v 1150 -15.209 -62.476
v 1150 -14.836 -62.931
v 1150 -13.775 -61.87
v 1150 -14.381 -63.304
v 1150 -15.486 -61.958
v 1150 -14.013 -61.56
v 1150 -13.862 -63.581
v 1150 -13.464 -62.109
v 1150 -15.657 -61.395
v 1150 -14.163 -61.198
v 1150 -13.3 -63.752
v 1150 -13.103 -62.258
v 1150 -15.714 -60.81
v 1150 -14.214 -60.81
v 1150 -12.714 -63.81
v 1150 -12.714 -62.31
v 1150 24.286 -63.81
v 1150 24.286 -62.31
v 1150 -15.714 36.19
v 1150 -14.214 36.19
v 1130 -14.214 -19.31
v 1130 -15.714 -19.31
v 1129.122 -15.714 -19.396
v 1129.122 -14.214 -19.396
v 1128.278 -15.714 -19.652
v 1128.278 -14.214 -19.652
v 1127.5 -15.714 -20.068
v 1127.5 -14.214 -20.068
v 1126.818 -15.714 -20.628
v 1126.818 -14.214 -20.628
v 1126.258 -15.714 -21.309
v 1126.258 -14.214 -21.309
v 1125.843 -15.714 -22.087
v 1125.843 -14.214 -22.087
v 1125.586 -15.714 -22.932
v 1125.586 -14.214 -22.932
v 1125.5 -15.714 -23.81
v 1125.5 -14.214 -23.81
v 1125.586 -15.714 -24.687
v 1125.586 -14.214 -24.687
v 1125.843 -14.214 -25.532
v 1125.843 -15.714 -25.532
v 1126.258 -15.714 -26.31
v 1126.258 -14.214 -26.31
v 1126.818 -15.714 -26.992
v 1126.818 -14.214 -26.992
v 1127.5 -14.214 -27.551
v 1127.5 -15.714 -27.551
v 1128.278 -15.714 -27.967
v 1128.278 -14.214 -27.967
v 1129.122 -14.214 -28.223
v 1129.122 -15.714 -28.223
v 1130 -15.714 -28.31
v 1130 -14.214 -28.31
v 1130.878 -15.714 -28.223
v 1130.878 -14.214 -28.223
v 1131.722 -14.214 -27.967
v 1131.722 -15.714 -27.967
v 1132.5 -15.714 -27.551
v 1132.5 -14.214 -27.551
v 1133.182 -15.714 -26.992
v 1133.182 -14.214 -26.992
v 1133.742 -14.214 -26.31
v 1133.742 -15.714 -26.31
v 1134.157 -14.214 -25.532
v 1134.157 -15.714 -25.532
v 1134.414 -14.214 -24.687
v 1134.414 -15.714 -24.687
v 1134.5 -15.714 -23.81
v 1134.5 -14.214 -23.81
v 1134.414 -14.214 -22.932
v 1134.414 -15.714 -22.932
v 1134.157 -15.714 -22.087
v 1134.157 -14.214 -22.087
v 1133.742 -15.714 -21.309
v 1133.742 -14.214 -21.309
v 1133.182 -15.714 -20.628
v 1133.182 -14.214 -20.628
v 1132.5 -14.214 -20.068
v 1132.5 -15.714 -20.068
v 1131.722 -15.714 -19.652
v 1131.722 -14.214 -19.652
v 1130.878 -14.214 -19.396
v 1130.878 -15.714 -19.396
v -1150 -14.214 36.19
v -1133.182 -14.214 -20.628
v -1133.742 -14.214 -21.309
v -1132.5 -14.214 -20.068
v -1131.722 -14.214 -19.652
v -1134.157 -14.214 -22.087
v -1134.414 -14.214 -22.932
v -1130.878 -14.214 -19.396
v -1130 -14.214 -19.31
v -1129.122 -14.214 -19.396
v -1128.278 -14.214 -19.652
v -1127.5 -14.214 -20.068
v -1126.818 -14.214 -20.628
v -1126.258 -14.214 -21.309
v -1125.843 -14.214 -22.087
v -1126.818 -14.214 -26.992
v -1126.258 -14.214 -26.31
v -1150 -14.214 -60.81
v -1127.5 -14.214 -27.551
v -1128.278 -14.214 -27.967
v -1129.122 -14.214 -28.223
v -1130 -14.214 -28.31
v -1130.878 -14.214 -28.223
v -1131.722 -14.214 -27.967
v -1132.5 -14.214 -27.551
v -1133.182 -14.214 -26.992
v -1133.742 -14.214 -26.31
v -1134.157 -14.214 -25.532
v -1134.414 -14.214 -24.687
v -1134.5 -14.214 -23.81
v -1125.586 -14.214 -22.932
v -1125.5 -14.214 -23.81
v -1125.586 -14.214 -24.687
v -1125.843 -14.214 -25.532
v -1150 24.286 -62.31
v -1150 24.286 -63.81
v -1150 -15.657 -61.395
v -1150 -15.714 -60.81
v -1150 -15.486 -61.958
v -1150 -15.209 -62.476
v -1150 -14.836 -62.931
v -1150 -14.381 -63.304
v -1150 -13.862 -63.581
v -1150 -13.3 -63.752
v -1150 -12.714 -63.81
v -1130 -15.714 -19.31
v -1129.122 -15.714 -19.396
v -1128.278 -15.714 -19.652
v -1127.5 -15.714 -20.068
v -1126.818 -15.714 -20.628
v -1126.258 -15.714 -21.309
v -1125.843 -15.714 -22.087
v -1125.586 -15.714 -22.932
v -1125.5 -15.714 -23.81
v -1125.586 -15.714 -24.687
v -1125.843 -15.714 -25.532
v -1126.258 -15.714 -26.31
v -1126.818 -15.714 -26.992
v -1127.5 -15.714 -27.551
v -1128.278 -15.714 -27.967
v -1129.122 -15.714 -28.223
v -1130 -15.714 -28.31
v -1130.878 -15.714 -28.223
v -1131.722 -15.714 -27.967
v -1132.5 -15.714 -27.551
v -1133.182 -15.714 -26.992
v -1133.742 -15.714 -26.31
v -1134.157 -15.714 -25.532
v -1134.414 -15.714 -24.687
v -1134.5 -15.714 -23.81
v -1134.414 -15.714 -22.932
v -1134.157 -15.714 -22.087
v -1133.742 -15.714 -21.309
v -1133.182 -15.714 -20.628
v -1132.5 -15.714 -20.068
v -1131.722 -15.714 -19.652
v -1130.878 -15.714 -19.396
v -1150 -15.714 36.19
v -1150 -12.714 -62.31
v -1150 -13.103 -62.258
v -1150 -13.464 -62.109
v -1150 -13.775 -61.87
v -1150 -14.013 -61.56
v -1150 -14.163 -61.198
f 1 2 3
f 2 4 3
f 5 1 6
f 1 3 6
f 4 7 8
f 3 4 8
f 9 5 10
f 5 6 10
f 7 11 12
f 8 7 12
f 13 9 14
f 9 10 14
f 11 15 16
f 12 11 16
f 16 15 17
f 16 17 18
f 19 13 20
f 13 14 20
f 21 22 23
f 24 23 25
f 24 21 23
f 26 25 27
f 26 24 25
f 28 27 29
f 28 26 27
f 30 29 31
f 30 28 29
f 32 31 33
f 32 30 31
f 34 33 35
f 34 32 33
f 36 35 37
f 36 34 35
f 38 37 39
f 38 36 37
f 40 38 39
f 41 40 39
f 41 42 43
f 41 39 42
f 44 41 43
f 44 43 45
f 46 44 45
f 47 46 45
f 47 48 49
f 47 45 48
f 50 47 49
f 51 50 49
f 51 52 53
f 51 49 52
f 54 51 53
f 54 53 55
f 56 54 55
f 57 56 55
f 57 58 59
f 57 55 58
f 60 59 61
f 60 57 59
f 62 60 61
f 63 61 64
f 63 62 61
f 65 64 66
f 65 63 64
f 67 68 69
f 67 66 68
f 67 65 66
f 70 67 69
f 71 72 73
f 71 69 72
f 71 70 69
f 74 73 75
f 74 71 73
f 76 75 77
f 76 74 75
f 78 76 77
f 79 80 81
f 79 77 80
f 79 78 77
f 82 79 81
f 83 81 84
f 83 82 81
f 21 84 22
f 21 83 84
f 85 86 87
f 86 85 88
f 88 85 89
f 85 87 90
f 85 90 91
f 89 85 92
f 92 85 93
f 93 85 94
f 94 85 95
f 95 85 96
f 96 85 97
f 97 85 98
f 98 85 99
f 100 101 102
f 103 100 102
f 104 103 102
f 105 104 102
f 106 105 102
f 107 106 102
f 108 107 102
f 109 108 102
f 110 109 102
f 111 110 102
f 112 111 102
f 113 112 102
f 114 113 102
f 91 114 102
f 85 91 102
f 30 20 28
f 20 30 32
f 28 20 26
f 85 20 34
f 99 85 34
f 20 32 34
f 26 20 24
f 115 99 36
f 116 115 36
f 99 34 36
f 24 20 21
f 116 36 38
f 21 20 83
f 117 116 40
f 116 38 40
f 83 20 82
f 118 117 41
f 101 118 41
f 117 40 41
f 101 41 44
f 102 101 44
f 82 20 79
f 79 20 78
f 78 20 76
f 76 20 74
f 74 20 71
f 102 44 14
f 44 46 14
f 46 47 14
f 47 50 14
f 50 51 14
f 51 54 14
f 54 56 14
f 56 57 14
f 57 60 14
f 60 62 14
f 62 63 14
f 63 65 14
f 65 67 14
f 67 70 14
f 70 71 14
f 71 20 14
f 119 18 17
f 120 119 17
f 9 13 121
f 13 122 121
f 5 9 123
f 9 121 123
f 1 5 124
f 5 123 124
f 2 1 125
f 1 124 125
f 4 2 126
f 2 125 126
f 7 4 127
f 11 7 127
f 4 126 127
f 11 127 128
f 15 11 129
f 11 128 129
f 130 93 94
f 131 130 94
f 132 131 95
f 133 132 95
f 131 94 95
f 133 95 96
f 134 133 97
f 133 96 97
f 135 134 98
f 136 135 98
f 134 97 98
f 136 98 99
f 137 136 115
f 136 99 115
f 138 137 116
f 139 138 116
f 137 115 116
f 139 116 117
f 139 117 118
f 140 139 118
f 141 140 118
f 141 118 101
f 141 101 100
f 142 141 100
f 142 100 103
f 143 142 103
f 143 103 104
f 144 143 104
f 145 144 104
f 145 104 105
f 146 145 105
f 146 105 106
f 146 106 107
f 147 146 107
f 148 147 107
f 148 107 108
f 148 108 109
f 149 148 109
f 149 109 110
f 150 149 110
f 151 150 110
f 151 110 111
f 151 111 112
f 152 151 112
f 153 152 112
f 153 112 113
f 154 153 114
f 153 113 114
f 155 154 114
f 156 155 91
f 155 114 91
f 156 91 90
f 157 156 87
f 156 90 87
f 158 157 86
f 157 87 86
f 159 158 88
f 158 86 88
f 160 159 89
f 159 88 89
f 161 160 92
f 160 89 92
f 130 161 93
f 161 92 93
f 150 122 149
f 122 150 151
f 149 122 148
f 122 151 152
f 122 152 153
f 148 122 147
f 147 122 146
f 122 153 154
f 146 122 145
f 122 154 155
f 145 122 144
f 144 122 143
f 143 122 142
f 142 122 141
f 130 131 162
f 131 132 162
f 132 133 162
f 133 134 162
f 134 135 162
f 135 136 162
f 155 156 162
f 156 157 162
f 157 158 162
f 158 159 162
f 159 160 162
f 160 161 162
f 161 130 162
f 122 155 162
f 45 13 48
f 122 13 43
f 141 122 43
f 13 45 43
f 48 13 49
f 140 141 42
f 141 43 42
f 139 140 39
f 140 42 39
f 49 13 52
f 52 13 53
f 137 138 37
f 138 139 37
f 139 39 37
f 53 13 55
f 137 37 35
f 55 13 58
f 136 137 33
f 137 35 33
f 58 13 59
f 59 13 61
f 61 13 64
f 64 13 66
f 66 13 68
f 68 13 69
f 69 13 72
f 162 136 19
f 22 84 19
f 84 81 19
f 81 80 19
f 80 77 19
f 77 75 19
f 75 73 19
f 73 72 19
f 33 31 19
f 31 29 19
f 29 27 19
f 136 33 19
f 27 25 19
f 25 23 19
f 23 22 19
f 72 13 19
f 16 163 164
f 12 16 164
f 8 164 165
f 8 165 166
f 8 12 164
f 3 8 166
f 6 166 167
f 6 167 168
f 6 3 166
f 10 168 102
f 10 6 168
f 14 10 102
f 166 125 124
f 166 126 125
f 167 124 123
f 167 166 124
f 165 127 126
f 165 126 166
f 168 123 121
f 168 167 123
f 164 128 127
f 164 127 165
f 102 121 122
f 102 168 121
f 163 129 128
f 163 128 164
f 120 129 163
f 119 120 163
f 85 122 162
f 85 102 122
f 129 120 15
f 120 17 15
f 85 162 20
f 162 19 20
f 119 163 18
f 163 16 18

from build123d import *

# Parameters (mm, degrees)
EXTRUDE_THIN1_DEPTH = 1150
FILLET1_R           = 1.5
FILLET2_R           = 3
SKETCH2_R           = 4.5
CUT_EXTRUDE1_DEPTH  = 10


with BuildPart() as part:
    # Sketch1 → Extrude-Thin1 (new, symmetric)
    with BuildSketch(Plane(origin=(0, 0, 0), x_dir=(0, 0, -1), z_dir=(1, 0, 0))):
        Polygon((63.80952381, 24.285714286), (63.80952381, -15.714285714), (-36.19047619, -15.714285714), (-36.19047619, -14.214285714), (62.30952381, -14.214285714), (62.30952381, 24.285714286), align=None)
    extrude(amount=EXTRUDE_THIN1_DEPTH, both=True)

    # Fillet1
    fillet1_edges = [part.edges().sort_by_distance(p)[0] for p in [
        (0, -14.214285714, -62.30952381),
    ]]
    fillet(fillet1_edges, radius=FILLET1_R)

    # Fillet2
    fillet2_edges = [part.edges().sort_by_distance(p)[0] for p in [
        (0, -15.714285714, -63.80952381),
    ]]
    fillet(fillet2_edges, radius=FILLET2_R)

    # Sketch2 → Cut-Extrude1 (cut)
    with BuildSketch(Plane(origin=(0, -14.214285714, 0), x_dir=(1, 0, 0), z_dir=(0, 1, 0))):
        with Locations(Location((-1130, 23.80952381, 0), (0, 0, 270))):
            Circle(SKETCH2_R)
    cut_extrude1 = extrude(amount=-CUT_EXTRUDE1_DEPTH, mode=Mode.SUBTRACT)

    # Mirror1: Cut-Extrude1 across plane
    add(cut_extrude1.mirror(Plane(origin=(0, 0, 0), x_dir=(0, 0, 1), z_dir=(1, 0, 0))), mode=Mode.SUBTRACT)


solid = part.part
